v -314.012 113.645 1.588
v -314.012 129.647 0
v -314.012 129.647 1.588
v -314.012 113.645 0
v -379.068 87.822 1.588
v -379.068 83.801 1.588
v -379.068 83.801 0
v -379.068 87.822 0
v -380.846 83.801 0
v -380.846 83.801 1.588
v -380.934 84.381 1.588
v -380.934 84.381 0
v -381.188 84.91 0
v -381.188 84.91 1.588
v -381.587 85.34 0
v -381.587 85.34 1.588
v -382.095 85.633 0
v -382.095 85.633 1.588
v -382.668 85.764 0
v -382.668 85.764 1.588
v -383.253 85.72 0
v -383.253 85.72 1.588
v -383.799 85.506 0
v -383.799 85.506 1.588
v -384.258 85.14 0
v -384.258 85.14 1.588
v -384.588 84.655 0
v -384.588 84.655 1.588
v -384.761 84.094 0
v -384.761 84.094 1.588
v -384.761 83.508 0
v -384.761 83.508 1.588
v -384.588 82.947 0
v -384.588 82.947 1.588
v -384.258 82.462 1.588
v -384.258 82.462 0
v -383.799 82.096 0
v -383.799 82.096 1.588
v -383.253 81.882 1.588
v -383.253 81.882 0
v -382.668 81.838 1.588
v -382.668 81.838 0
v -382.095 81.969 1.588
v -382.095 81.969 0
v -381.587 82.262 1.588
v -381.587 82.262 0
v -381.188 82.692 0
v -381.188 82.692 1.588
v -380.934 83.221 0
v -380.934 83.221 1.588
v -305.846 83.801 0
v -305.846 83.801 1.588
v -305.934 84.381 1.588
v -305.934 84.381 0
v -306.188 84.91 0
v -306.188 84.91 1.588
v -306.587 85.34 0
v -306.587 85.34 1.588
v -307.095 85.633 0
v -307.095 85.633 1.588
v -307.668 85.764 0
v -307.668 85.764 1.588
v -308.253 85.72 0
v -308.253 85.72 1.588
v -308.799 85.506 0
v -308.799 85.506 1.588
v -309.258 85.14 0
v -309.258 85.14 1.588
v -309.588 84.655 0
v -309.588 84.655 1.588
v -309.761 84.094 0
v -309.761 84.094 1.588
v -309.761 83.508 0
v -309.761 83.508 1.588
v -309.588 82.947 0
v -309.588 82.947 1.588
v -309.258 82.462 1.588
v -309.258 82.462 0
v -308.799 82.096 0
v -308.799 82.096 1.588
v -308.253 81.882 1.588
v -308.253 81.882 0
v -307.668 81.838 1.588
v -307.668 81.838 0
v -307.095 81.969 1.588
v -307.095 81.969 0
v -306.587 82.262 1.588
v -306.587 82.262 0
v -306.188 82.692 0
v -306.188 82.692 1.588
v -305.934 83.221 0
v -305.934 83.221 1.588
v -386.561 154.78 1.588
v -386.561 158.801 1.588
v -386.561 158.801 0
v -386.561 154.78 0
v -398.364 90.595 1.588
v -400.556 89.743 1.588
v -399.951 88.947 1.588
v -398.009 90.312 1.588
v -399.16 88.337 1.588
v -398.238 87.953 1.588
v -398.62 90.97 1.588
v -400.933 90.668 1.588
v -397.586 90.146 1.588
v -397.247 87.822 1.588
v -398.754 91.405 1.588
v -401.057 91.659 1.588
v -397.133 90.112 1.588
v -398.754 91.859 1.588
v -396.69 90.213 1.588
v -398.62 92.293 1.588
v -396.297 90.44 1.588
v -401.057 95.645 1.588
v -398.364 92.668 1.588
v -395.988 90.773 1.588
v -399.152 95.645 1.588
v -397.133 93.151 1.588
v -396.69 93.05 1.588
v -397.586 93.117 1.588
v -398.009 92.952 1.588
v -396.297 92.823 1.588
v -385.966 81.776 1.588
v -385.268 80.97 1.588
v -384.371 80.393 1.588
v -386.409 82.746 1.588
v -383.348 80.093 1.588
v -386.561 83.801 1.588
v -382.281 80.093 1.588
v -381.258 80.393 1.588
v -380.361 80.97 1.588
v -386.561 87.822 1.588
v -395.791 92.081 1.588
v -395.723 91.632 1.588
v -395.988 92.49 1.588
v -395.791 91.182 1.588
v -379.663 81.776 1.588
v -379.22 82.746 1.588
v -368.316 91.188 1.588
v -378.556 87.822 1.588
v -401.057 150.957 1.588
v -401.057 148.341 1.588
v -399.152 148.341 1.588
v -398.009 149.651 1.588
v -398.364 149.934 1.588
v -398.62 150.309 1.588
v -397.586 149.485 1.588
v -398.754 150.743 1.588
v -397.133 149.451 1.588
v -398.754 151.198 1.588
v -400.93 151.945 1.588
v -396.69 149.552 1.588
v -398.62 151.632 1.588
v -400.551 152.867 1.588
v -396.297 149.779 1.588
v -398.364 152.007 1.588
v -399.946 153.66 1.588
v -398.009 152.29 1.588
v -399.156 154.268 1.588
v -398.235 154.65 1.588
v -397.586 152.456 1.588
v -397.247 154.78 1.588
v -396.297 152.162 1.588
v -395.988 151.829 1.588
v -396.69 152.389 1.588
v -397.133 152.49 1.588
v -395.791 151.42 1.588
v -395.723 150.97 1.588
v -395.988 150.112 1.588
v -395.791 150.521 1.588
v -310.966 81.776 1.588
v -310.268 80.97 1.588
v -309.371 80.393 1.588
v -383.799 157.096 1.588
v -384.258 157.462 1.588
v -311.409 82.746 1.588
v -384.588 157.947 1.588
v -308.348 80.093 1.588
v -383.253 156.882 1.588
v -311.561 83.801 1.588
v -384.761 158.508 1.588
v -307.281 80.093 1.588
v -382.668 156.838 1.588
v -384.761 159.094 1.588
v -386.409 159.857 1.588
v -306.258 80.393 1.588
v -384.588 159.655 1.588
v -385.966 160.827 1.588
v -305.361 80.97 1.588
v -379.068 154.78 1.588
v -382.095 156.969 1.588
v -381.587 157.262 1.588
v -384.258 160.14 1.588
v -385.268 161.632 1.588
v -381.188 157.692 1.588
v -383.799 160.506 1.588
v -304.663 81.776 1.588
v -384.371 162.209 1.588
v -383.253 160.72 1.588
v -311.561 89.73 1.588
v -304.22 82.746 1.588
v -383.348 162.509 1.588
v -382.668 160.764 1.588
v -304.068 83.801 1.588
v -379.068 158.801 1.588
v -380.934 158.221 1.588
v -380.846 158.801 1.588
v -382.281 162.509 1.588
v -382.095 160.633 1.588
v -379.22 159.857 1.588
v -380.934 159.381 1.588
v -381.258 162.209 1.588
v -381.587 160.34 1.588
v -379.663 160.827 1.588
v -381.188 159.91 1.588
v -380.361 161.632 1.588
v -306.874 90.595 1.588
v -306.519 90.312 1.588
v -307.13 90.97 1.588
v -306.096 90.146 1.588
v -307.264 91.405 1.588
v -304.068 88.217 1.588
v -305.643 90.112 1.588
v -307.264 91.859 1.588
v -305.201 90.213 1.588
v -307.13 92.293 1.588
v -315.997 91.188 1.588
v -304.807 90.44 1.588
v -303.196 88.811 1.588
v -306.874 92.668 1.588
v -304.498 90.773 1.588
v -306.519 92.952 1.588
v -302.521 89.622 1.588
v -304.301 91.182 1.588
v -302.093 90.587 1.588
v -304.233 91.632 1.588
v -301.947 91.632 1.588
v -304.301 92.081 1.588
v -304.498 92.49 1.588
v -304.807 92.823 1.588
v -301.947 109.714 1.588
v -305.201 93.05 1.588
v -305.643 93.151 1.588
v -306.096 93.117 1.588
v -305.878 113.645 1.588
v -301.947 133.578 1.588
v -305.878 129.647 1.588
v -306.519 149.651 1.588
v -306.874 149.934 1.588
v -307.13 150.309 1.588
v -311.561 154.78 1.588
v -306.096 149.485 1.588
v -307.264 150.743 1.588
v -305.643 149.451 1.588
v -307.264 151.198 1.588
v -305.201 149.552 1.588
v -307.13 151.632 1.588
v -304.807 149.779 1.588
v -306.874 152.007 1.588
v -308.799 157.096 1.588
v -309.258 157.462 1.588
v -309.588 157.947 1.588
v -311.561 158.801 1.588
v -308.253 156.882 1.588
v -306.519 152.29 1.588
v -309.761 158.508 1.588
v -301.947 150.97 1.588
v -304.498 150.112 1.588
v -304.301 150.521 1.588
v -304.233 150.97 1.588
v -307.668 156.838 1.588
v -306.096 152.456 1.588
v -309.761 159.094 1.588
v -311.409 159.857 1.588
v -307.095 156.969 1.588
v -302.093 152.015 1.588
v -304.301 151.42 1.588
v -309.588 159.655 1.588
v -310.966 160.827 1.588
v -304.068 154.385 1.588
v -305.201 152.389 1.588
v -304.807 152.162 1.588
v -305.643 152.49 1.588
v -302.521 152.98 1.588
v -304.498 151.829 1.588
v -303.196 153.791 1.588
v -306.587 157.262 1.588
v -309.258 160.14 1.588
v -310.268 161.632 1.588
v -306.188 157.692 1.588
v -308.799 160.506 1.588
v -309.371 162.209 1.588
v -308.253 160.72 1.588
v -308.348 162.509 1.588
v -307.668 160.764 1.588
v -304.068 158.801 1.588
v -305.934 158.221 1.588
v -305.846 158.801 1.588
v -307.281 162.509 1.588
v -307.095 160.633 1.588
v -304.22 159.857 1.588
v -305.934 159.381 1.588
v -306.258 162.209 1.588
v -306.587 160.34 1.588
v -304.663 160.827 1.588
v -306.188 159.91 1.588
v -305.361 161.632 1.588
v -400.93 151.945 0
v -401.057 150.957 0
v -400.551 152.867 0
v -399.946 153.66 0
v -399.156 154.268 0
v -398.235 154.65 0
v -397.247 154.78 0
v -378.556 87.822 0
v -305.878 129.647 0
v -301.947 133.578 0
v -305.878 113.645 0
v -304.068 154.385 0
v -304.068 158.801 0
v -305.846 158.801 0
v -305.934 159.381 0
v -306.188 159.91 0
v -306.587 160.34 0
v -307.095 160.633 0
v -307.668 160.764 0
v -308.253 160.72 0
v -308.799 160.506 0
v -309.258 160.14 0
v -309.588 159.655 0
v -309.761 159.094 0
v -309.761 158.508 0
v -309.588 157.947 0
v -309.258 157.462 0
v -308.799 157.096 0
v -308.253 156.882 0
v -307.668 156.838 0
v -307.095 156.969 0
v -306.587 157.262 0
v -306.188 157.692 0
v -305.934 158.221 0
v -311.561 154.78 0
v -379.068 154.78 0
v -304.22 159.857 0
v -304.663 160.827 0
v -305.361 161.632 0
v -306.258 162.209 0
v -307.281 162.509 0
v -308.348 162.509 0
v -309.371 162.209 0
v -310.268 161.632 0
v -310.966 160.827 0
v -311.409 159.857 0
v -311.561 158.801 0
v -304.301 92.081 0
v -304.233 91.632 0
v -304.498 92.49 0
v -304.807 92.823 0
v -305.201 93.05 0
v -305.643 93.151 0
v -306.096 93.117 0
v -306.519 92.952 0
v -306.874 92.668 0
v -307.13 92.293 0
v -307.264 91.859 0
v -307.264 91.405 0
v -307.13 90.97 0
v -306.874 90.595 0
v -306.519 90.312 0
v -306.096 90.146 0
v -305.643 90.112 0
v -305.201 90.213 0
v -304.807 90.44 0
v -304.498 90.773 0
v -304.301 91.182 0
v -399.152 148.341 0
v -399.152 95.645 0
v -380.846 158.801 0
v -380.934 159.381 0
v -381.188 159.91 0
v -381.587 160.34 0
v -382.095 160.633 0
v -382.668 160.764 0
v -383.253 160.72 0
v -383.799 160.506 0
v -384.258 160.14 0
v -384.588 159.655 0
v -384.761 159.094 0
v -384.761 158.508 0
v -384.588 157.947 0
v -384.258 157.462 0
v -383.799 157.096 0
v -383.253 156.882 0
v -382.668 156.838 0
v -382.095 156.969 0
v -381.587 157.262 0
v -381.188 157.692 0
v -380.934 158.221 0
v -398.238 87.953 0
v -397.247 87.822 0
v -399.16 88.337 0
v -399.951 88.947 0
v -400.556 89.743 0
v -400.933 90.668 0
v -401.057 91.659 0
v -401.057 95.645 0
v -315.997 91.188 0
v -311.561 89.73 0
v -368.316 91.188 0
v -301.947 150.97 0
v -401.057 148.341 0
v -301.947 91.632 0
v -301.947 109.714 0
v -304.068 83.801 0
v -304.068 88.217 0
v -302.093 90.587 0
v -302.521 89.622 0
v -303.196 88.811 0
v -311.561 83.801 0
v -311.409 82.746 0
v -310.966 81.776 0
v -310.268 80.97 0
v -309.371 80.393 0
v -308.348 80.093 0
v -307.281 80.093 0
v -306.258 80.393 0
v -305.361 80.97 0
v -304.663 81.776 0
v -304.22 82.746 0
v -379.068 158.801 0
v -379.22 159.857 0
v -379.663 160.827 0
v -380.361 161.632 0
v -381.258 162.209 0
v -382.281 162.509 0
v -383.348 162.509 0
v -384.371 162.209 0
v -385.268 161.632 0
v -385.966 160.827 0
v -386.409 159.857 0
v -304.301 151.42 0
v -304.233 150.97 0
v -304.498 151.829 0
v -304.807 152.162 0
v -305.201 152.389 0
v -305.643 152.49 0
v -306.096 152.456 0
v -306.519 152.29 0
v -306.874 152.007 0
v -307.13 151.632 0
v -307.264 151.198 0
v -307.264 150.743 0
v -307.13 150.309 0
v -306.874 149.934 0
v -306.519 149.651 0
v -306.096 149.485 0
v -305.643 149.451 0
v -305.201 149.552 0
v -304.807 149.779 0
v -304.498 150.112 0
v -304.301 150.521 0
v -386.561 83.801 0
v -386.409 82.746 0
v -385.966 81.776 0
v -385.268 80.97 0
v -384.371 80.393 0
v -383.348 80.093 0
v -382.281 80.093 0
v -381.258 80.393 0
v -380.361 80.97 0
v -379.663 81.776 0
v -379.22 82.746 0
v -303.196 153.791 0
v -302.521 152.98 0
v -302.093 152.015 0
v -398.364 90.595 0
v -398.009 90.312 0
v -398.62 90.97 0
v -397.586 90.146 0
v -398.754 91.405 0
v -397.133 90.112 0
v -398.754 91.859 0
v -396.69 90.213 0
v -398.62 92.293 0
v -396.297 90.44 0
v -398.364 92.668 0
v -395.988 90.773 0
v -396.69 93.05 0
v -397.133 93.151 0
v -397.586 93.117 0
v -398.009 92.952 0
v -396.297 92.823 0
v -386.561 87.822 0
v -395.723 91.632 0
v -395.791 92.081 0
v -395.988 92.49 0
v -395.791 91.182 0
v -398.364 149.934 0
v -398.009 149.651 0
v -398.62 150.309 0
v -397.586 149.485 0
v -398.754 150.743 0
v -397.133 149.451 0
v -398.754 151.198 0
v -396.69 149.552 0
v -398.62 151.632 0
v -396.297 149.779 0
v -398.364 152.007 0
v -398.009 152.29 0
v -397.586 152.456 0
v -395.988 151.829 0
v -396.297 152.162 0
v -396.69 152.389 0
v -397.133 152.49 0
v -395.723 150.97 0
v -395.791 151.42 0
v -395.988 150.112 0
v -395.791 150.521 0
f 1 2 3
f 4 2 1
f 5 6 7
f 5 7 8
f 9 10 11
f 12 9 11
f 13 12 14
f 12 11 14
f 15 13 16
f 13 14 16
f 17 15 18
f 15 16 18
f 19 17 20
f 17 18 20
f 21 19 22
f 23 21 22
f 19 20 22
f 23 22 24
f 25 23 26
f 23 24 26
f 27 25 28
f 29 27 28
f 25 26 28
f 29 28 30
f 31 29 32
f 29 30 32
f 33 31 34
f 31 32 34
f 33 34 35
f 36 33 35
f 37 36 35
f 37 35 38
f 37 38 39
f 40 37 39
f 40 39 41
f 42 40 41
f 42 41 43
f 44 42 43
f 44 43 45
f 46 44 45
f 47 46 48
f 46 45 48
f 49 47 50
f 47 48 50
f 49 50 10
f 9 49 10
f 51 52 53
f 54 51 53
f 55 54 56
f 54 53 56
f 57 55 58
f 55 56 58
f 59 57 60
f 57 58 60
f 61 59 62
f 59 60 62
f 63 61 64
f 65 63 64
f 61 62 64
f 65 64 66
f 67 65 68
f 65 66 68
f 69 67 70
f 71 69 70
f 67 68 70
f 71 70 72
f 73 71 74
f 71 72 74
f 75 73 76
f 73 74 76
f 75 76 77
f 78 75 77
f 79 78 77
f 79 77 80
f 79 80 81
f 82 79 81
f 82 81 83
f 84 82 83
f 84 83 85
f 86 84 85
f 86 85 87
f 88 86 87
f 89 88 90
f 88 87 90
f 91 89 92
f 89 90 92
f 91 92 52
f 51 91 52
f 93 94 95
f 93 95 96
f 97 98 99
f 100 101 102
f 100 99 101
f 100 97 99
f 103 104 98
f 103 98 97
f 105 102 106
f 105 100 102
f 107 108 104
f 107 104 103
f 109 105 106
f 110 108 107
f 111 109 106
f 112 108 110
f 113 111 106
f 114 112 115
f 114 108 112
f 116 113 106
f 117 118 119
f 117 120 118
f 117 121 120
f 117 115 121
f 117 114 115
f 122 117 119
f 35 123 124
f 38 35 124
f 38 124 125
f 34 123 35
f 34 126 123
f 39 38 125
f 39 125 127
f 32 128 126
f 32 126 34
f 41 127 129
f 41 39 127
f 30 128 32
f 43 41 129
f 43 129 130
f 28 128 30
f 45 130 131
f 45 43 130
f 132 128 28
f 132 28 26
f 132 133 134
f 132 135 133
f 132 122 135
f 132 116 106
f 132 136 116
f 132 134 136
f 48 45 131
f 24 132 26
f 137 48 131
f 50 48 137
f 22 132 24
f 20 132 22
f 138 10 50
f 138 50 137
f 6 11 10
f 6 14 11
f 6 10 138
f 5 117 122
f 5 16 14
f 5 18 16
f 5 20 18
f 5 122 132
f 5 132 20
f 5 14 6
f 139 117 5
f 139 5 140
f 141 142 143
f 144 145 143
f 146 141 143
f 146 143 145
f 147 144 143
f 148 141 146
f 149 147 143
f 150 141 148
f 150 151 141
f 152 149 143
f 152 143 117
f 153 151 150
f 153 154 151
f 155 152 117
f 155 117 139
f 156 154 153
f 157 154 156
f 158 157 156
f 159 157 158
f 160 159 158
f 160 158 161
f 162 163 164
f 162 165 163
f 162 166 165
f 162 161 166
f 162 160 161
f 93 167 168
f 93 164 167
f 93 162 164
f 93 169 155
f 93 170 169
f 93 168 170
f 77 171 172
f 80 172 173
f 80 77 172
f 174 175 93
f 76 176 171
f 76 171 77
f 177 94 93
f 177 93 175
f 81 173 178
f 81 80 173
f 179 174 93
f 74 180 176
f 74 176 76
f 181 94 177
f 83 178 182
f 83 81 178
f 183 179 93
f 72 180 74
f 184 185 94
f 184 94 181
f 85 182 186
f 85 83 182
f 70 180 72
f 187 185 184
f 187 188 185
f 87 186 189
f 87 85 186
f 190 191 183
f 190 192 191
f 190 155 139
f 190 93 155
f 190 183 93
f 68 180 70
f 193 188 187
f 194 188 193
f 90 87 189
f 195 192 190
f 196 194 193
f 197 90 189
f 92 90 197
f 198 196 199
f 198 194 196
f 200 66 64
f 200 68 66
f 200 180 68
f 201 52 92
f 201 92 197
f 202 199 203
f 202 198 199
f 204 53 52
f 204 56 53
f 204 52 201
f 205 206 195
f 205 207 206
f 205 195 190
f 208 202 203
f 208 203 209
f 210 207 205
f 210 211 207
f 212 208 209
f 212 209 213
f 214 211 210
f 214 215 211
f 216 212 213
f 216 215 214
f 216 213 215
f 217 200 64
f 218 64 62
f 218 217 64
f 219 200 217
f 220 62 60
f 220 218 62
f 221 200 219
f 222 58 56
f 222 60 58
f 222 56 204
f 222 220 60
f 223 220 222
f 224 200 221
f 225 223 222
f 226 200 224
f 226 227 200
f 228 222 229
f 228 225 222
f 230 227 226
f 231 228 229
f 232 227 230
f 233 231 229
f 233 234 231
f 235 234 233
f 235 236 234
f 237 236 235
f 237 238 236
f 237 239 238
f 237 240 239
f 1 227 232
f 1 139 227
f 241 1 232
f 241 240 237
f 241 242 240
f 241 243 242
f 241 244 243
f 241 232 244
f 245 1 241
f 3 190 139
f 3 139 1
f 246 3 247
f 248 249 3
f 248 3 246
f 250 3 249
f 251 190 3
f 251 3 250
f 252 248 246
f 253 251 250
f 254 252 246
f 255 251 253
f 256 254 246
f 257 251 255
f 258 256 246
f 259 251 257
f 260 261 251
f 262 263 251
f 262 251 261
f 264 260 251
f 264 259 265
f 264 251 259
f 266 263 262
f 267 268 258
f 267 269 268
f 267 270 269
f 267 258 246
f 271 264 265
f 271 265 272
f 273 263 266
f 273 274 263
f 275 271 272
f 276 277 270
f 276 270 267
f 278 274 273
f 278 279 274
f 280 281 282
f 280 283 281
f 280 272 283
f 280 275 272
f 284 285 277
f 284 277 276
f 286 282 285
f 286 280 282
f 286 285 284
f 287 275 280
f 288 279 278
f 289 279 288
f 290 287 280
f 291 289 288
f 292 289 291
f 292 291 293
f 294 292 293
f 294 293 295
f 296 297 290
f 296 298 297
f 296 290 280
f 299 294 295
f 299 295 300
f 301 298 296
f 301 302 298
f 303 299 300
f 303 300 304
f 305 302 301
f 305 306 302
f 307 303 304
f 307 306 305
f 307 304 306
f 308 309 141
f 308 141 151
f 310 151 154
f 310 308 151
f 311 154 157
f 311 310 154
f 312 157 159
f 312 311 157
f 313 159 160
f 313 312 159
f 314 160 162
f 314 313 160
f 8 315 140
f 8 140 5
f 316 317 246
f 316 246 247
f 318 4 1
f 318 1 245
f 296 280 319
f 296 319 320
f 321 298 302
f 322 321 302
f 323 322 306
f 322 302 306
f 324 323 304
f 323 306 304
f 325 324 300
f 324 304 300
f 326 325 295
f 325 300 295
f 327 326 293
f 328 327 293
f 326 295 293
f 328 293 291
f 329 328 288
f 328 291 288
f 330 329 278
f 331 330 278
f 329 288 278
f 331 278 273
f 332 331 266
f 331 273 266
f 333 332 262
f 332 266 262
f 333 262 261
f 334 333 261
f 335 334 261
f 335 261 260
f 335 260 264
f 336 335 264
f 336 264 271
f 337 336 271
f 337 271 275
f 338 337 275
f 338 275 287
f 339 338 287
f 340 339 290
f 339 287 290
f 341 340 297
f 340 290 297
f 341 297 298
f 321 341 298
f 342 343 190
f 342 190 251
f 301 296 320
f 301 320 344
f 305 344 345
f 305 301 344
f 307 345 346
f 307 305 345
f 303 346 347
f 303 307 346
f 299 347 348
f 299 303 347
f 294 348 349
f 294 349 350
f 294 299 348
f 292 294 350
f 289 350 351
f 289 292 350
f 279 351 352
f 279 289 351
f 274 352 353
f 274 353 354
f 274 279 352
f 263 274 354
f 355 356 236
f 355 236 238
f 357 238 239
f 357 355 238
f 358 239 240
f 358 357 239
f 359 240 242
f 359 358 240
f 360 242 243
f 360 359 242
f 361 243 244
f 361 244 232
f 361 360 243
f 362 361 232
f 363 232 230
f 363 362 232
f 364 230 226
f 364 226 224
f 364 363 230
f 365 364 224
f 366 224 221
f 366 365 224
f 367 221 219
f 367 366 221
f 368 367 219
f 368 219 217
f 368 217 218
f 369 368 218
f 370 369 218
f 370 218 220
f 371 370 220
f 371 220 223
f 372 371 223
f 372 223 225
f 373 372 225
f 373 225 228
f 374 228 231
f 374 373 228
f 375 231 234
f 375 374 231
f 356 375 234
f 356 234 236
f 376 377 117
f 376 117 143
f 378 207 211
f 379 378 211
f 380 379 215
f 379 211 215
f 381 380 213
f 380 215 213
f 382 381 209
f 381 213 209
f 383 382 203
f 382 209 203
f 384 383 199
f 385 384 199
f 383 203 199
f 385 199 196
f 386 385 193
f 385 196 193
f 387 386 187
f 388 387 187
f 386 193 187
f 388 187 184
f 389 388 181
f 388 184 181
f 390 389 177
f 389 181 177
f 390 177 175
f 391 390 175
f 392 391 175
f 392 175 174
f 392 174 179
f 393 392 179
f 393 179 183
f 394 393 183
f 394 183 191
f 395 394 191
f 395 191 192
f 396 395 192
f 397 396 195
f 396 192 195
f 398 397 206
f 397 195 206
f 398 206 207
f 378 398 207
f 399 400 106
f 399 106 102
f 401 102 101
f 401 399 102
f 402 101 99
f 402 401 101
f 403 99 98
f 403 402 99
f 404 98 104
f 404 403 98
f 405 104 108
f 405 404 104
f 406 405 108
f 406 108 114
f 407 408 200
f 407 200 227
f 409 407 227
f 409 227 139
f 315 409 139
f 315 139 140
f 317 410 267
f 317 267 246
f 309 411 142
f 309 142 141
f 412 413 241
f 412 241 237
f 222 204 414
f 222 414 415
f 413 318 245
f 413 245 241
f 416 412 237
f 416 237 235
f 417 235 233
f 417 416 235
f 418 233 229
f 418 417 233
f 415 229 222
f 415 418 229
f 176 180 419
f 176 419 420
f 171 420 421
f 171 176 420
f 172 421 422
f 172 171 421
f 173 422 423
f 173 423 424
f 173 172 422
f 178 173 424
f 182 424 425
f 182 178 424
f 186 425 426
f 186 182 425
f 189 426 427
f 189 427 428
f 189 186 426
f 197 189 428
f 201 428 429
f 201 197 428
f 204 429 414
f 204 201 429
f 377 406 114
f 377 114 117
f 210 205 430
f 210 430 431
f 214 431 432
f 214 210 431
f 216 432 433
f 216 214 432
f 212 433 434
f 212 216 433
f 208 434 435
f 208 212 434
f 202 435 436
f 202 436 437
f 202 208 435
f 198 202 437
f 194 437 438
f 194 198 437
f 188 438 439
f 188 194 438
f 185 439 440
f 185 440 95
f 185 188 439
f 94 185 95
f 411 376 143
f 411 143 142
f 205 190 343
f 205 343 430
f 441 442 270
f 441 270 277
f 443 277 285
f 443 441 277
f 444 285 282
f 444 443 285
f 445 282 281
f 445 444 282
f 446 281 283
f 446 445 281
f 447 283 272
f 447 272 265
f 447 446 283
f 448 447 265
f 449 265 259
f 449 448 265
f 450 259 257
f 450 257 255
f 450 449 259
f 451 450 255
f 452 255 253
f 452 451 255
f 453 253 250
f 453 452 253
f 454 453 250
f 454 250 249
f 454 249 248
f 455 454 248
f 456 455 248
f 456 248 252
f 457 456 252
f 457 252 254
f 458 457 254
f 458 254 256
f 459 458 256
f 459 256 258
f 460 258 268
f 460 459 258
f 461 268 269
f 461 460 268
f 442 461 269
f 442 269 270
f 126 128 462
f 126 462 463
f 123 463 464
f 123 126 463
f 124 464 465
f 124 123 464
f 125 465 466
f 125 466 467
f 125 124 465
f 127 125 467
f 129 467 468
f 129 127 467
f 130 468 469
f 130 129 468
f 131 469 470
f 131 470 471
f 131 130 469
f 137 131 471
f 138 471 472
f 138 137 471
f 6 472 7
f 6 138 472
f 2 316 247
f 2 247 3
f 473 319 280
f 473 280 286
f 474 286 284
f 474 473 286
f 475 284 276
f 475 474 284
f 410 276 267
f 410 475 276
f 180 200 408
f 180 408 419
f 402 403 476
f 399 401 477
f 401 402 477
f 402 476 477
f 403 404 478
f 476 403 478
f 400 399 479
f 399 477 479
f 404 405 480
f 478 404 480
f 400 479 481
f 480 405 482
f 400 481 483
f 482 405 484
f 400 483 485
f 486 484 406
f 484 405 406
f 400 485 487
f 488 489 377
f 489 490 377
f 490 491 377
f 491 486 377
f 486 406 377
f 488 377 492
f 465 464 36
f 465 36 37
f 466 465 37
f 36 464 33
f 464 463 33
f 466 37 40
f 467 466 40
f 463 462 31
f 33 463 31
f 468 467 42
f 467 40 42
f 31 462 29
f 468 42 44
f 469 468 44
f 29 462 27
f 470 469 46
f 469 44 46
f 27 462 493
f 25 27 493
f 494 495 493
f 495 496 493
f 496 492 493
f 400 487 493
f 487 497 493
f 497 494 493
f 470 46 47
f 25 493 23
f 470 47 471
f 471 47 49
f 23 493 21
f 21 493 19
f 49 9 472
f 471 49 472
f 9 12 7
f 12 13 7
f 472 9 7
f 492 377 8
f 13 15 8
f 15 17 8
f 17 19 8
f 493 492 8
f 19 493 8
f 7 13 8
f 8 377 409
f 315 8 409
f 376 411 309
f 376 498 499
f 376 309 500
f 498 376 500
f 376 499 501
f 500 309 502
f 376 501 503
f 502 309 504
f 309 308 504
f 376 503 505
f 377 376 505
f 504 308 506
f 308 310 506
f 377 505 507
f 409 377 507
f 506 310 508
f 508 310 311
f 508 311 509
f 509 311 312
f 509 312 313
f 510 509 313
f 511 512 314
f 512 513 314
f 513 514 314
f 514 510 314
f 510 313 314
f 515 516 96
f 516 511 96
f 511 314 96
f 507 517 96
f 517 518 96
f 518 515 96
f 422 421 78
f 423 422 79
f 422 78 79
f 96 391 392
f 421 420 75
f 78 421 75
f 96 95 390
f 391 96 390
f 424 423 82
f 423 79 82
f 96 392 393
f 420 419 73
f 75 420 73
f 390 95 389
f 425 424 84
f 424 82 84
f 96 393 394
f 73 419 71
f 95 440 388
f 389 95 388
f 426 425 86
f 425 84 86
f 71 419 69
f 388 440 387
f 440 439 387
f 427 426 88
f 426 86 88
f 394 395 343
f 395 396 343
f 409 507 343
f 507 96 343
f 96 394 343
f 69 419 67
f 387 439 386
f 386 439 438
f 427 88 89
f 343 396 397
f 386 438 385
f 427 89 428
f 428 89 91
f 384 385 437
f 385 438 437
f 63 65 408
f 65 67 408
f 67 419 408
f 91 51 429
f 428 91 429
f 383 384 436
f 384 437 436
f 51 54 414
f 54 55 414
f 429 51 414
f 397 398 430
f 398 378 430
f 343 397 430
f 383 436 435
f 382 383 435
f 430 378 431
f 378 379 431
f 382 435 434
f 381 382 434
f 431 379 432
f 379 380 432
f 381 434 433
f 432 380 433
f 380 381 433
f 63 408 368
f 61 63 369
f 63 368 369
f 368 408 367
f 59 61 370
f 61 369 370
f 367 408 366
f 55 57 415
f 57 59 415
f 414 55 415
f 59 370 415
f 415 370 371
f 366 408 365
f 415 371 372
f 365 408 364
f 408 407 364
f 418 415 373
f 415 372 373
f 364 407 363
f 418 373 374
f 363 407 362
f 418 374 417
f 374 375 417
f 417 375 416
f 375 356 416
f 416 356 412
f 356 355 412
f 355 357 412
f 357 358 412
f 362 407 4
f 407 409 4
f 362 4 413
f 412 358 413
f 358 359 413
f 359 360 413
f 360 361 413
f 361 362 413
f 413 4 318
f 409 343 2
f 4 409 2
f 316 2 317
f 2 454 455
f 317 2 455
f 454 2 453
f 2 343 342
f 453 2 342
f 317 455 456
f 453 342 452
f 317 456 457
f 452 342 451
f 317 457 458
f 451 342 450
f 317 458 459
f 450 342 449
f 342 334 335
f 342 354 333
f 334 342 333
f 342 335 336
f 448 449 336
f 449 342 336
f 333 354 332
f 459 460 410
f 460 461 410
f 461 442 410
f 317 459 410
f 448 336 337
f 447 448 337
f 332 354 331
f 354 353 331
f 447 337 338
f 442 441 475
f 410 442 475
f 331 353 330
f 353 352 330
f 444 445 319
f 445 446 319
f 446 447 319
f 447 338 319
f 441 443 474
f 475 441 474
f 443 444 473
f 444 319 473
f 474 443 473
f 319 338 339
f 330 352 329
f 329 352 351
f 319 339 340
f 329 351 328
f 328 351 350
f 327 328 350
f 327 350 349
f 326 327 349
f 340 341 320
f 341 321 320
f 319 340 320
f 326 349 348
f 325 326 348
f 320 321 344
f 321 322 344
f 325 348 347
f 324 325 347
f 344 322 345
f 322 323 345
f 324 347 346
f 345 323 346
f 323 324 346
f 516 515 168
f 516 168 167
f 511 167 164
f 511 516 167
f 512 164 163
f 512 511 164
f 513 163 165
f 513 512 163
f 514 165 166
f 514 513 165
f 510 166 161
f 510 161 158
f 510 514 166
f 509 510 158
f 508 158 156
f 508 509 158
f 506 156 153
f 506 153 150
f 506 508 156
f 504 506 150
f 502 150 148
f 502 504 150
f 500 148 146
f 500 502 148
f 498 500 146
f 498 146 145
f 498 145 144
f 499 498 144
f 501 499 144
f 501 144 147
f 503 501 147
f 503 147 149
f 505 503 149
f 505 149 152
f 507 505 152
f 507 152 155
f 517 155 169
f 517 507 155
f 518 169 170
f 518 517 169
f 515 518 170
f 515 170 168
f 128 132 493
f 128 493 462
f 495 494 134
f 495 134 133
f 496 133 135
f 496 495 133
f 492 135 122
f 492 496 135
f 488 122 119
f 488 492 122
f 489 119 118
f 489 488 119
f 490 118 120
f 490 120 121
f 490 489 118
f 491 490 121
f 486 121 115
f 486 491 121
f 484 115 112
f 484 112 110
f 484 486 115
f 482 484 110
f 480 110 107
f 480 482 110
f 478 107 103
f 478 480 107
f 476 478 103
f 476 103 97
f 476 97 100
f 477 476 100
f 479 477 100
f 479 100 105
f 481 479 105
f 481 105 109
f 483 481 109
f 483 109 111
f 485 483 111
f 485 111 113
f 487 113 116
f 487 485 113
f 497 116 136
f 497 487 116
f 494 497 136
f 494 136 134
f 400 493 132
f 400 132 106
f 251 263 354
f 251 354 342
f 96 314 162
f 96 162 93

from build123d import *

# Parameters (mm, degrees)
SKETCH1_R           = 1.524
BOSS_EXTRUDE1_DEPTH = 1.5875
SKETCH8_R           = 3.7465
SKETCH8_R_2         = 1.9685
BOSS_EXTRUDE6_DEPTH = 1.5875


with BuildPart() as part:
    # Sketch1 → Boss-Extrude1 (new body)
    with BuildSketch(Plane.XY):
        with BuildLine():
            Line((-301.9473, 133.57775), (-305.87795, 129.6471))
            Line((-305.87795, 129.6471), (-314.0123, 129.6471))
            Line((-314.0123, 129.6471), (-314.0123, 113.6451))
            Line((-314.0123, 113.6451), (-305.87795, 113.6451))
            Line((-305.87795, 113.6451), (-301.9473, 109.71445))
            Line((-301.9473, 109.71445), (-301.9473, 91.6317))
            ThreePointArc((-301.9473, 91.6317), (-303.063223164, 88.937623164), (-305.7573, 87.8217))
            Line((-305.7573, 87.8217), (-315.9973, 91.1883))
            Line((-315.9973, 91.1883), (-368.3165, 91.1883))
            Line((-368.3165, 91.1883), (-378.5565, 87.8217))
            Line((-378.5565, 87.8217), (-397.2472, 87.8217))
            ThreePointArc((-397.2472, 87.8217), (-399.951018769, 88.947400452), (-401.0571, 91.659304166))
            Line((-401.0571, 91.659304166), (-401.0571, 95.6449))
            Line((-401.0571, 95.6449), (-399.1521, 95.6449))
            Line((-399.1521, 95.6449), (-399.1521, 148.341))
            Line((-399.1521, 148.341), (-401.0571, 148.341))
            Line((-401.0571, 148.341), (-401.0571, 150.956597849))
            ThreePointArc((-401.0571, 150.956597849), (-399.946077222, 153.659592612), (-397.247125, 154.7804))
            Line((-397.247125, 154.7804), (-305.7573, 154.7804))
            ThreePointArc((-305.7573, 154.7804), (-303.063223164, 153.664476836), (-301.9473, 150.9704))
            Line((-301.9473, 150.9704), (-301.9473, 133.57775))
        make_face()
        with Locations((-305.7573, 150.9704)):
            Circle(SKETCH1_R, mode=Mode.SUBTRACT)
        with Locations((-397.247125, 150.9704)):
            Circle(SKETCH1_R, mode=Mode.SUBTRACT)
        with Locations((-397.2472, 91.6317)):
            Circle(SKETCH1_R, mode=Mode.SUBTRACT)
        with Locations((-305.7573, 91.6317)):
            Circle(SKETCH1_R, mode=Mode.SUBTRACT)
    extrude(amount=BOSS_EXTRUDE1_DEPTH)

    # Sketch8 → Boss-Extrude6 (add)
    with BuildSketch(Plane.XY.offset(1.5875)):
        with BuildLine():
            ThreePointArc((-379.068128555, 158.80105), (-382.814628555, 155.05455), (-386.561128555, 158.80105))
            Line((-386.561128555, 158.80105), (-386.561128555, 154.7804))
            Line((-386.561128555, 154.7804), (-379.068128555, 154.7804))
            Line((-379.068128555, 154.7804), (-379.068128555, 158.80105))
        make_face()
        with Locations((-382.814628555, 158.80105)):
            Circle(SKETCH8_R)
        with Locations((-382.814628555, 158.80105)):
            Circle(SKETCH8_R_2, mode=Mode.SUBTRACT)
        with BuildLine():
            Line((-311.561128555, 158.80105), (-311.561128555, 154.7804))
            Line((-311.561128555, 154.7804), (-305.7573, 154.7804))
            ThreePointArc((-305.7573, 154.7804), (-304.889939249, 154.680357591), (-304.068128555, 154.385484162))
            Line((-304.068128555, 154.385484162), (-304.068128555, 158.80105))
            ThreePointArc((-304.068128555, 158.80105), (-307.814628555, 155.05455), (-311.561128555, 158.80105))
        make_face()
        with Locations((-307.814628555, 158.80105)):
            Circle(SKETCH8_R)
        with Locations((-307.814628555, 158.80105)):
            Circle(SKETCH8_R_2, mode=Mode.SUBTRACT)
        with BuildLine():
            Line((-311.561128555, 89.729821994), (-311.561128555, 83.80105))
            ThreePointArc((-311.561128555, 83.80105), (-307.814628555, 87.54755), (-304.068128555, 83.80105))
            Line((-304.068128555, 83.80105), (-304.068128555, 88.216615838))
            ThreePointArc((-304.068128555, 88.216615838), (-304.889939249, 87.921742409), (-305.7573, 87.8217))
            Line((-305.7573, 87.8217), (-311.561128555, 89.729821994))
        make_face()
        with Locations((-307.814628555, 83.80105)):
            Circle(SKETCH8_R)
        with Locations((-307.814628555, 83.80105)):
            Circle(SKETCH8_R_2, mode=Mode.SUBTRACT)
        with BuildLine():
            ThreePointArc((-386.561128555, 83.80105), (-382.814628555, 87.54755), (-379.068128555, 83.80105))
            Line((-379.068128555, 83.80105), (-379.068128555, 87.8217))
            Line((-379.068128555, 87.8217), (-386.561128555, 87.8217))
            Line((-386.561128555, 87.8217), (-386.561128555, 83.80105))
        make_face()
        with Locations((-382.814628555, 83.80105)):
            Circle(SKETCH8_R)
        with Locations((-382.814628555, 83.80105)):
            Circle(SKETCH8_R_2, mode=Mode.SUBTRACT)
    extrude(amount=-BOSS_EXTRUDE6_DEPTH)


solid = part.part
